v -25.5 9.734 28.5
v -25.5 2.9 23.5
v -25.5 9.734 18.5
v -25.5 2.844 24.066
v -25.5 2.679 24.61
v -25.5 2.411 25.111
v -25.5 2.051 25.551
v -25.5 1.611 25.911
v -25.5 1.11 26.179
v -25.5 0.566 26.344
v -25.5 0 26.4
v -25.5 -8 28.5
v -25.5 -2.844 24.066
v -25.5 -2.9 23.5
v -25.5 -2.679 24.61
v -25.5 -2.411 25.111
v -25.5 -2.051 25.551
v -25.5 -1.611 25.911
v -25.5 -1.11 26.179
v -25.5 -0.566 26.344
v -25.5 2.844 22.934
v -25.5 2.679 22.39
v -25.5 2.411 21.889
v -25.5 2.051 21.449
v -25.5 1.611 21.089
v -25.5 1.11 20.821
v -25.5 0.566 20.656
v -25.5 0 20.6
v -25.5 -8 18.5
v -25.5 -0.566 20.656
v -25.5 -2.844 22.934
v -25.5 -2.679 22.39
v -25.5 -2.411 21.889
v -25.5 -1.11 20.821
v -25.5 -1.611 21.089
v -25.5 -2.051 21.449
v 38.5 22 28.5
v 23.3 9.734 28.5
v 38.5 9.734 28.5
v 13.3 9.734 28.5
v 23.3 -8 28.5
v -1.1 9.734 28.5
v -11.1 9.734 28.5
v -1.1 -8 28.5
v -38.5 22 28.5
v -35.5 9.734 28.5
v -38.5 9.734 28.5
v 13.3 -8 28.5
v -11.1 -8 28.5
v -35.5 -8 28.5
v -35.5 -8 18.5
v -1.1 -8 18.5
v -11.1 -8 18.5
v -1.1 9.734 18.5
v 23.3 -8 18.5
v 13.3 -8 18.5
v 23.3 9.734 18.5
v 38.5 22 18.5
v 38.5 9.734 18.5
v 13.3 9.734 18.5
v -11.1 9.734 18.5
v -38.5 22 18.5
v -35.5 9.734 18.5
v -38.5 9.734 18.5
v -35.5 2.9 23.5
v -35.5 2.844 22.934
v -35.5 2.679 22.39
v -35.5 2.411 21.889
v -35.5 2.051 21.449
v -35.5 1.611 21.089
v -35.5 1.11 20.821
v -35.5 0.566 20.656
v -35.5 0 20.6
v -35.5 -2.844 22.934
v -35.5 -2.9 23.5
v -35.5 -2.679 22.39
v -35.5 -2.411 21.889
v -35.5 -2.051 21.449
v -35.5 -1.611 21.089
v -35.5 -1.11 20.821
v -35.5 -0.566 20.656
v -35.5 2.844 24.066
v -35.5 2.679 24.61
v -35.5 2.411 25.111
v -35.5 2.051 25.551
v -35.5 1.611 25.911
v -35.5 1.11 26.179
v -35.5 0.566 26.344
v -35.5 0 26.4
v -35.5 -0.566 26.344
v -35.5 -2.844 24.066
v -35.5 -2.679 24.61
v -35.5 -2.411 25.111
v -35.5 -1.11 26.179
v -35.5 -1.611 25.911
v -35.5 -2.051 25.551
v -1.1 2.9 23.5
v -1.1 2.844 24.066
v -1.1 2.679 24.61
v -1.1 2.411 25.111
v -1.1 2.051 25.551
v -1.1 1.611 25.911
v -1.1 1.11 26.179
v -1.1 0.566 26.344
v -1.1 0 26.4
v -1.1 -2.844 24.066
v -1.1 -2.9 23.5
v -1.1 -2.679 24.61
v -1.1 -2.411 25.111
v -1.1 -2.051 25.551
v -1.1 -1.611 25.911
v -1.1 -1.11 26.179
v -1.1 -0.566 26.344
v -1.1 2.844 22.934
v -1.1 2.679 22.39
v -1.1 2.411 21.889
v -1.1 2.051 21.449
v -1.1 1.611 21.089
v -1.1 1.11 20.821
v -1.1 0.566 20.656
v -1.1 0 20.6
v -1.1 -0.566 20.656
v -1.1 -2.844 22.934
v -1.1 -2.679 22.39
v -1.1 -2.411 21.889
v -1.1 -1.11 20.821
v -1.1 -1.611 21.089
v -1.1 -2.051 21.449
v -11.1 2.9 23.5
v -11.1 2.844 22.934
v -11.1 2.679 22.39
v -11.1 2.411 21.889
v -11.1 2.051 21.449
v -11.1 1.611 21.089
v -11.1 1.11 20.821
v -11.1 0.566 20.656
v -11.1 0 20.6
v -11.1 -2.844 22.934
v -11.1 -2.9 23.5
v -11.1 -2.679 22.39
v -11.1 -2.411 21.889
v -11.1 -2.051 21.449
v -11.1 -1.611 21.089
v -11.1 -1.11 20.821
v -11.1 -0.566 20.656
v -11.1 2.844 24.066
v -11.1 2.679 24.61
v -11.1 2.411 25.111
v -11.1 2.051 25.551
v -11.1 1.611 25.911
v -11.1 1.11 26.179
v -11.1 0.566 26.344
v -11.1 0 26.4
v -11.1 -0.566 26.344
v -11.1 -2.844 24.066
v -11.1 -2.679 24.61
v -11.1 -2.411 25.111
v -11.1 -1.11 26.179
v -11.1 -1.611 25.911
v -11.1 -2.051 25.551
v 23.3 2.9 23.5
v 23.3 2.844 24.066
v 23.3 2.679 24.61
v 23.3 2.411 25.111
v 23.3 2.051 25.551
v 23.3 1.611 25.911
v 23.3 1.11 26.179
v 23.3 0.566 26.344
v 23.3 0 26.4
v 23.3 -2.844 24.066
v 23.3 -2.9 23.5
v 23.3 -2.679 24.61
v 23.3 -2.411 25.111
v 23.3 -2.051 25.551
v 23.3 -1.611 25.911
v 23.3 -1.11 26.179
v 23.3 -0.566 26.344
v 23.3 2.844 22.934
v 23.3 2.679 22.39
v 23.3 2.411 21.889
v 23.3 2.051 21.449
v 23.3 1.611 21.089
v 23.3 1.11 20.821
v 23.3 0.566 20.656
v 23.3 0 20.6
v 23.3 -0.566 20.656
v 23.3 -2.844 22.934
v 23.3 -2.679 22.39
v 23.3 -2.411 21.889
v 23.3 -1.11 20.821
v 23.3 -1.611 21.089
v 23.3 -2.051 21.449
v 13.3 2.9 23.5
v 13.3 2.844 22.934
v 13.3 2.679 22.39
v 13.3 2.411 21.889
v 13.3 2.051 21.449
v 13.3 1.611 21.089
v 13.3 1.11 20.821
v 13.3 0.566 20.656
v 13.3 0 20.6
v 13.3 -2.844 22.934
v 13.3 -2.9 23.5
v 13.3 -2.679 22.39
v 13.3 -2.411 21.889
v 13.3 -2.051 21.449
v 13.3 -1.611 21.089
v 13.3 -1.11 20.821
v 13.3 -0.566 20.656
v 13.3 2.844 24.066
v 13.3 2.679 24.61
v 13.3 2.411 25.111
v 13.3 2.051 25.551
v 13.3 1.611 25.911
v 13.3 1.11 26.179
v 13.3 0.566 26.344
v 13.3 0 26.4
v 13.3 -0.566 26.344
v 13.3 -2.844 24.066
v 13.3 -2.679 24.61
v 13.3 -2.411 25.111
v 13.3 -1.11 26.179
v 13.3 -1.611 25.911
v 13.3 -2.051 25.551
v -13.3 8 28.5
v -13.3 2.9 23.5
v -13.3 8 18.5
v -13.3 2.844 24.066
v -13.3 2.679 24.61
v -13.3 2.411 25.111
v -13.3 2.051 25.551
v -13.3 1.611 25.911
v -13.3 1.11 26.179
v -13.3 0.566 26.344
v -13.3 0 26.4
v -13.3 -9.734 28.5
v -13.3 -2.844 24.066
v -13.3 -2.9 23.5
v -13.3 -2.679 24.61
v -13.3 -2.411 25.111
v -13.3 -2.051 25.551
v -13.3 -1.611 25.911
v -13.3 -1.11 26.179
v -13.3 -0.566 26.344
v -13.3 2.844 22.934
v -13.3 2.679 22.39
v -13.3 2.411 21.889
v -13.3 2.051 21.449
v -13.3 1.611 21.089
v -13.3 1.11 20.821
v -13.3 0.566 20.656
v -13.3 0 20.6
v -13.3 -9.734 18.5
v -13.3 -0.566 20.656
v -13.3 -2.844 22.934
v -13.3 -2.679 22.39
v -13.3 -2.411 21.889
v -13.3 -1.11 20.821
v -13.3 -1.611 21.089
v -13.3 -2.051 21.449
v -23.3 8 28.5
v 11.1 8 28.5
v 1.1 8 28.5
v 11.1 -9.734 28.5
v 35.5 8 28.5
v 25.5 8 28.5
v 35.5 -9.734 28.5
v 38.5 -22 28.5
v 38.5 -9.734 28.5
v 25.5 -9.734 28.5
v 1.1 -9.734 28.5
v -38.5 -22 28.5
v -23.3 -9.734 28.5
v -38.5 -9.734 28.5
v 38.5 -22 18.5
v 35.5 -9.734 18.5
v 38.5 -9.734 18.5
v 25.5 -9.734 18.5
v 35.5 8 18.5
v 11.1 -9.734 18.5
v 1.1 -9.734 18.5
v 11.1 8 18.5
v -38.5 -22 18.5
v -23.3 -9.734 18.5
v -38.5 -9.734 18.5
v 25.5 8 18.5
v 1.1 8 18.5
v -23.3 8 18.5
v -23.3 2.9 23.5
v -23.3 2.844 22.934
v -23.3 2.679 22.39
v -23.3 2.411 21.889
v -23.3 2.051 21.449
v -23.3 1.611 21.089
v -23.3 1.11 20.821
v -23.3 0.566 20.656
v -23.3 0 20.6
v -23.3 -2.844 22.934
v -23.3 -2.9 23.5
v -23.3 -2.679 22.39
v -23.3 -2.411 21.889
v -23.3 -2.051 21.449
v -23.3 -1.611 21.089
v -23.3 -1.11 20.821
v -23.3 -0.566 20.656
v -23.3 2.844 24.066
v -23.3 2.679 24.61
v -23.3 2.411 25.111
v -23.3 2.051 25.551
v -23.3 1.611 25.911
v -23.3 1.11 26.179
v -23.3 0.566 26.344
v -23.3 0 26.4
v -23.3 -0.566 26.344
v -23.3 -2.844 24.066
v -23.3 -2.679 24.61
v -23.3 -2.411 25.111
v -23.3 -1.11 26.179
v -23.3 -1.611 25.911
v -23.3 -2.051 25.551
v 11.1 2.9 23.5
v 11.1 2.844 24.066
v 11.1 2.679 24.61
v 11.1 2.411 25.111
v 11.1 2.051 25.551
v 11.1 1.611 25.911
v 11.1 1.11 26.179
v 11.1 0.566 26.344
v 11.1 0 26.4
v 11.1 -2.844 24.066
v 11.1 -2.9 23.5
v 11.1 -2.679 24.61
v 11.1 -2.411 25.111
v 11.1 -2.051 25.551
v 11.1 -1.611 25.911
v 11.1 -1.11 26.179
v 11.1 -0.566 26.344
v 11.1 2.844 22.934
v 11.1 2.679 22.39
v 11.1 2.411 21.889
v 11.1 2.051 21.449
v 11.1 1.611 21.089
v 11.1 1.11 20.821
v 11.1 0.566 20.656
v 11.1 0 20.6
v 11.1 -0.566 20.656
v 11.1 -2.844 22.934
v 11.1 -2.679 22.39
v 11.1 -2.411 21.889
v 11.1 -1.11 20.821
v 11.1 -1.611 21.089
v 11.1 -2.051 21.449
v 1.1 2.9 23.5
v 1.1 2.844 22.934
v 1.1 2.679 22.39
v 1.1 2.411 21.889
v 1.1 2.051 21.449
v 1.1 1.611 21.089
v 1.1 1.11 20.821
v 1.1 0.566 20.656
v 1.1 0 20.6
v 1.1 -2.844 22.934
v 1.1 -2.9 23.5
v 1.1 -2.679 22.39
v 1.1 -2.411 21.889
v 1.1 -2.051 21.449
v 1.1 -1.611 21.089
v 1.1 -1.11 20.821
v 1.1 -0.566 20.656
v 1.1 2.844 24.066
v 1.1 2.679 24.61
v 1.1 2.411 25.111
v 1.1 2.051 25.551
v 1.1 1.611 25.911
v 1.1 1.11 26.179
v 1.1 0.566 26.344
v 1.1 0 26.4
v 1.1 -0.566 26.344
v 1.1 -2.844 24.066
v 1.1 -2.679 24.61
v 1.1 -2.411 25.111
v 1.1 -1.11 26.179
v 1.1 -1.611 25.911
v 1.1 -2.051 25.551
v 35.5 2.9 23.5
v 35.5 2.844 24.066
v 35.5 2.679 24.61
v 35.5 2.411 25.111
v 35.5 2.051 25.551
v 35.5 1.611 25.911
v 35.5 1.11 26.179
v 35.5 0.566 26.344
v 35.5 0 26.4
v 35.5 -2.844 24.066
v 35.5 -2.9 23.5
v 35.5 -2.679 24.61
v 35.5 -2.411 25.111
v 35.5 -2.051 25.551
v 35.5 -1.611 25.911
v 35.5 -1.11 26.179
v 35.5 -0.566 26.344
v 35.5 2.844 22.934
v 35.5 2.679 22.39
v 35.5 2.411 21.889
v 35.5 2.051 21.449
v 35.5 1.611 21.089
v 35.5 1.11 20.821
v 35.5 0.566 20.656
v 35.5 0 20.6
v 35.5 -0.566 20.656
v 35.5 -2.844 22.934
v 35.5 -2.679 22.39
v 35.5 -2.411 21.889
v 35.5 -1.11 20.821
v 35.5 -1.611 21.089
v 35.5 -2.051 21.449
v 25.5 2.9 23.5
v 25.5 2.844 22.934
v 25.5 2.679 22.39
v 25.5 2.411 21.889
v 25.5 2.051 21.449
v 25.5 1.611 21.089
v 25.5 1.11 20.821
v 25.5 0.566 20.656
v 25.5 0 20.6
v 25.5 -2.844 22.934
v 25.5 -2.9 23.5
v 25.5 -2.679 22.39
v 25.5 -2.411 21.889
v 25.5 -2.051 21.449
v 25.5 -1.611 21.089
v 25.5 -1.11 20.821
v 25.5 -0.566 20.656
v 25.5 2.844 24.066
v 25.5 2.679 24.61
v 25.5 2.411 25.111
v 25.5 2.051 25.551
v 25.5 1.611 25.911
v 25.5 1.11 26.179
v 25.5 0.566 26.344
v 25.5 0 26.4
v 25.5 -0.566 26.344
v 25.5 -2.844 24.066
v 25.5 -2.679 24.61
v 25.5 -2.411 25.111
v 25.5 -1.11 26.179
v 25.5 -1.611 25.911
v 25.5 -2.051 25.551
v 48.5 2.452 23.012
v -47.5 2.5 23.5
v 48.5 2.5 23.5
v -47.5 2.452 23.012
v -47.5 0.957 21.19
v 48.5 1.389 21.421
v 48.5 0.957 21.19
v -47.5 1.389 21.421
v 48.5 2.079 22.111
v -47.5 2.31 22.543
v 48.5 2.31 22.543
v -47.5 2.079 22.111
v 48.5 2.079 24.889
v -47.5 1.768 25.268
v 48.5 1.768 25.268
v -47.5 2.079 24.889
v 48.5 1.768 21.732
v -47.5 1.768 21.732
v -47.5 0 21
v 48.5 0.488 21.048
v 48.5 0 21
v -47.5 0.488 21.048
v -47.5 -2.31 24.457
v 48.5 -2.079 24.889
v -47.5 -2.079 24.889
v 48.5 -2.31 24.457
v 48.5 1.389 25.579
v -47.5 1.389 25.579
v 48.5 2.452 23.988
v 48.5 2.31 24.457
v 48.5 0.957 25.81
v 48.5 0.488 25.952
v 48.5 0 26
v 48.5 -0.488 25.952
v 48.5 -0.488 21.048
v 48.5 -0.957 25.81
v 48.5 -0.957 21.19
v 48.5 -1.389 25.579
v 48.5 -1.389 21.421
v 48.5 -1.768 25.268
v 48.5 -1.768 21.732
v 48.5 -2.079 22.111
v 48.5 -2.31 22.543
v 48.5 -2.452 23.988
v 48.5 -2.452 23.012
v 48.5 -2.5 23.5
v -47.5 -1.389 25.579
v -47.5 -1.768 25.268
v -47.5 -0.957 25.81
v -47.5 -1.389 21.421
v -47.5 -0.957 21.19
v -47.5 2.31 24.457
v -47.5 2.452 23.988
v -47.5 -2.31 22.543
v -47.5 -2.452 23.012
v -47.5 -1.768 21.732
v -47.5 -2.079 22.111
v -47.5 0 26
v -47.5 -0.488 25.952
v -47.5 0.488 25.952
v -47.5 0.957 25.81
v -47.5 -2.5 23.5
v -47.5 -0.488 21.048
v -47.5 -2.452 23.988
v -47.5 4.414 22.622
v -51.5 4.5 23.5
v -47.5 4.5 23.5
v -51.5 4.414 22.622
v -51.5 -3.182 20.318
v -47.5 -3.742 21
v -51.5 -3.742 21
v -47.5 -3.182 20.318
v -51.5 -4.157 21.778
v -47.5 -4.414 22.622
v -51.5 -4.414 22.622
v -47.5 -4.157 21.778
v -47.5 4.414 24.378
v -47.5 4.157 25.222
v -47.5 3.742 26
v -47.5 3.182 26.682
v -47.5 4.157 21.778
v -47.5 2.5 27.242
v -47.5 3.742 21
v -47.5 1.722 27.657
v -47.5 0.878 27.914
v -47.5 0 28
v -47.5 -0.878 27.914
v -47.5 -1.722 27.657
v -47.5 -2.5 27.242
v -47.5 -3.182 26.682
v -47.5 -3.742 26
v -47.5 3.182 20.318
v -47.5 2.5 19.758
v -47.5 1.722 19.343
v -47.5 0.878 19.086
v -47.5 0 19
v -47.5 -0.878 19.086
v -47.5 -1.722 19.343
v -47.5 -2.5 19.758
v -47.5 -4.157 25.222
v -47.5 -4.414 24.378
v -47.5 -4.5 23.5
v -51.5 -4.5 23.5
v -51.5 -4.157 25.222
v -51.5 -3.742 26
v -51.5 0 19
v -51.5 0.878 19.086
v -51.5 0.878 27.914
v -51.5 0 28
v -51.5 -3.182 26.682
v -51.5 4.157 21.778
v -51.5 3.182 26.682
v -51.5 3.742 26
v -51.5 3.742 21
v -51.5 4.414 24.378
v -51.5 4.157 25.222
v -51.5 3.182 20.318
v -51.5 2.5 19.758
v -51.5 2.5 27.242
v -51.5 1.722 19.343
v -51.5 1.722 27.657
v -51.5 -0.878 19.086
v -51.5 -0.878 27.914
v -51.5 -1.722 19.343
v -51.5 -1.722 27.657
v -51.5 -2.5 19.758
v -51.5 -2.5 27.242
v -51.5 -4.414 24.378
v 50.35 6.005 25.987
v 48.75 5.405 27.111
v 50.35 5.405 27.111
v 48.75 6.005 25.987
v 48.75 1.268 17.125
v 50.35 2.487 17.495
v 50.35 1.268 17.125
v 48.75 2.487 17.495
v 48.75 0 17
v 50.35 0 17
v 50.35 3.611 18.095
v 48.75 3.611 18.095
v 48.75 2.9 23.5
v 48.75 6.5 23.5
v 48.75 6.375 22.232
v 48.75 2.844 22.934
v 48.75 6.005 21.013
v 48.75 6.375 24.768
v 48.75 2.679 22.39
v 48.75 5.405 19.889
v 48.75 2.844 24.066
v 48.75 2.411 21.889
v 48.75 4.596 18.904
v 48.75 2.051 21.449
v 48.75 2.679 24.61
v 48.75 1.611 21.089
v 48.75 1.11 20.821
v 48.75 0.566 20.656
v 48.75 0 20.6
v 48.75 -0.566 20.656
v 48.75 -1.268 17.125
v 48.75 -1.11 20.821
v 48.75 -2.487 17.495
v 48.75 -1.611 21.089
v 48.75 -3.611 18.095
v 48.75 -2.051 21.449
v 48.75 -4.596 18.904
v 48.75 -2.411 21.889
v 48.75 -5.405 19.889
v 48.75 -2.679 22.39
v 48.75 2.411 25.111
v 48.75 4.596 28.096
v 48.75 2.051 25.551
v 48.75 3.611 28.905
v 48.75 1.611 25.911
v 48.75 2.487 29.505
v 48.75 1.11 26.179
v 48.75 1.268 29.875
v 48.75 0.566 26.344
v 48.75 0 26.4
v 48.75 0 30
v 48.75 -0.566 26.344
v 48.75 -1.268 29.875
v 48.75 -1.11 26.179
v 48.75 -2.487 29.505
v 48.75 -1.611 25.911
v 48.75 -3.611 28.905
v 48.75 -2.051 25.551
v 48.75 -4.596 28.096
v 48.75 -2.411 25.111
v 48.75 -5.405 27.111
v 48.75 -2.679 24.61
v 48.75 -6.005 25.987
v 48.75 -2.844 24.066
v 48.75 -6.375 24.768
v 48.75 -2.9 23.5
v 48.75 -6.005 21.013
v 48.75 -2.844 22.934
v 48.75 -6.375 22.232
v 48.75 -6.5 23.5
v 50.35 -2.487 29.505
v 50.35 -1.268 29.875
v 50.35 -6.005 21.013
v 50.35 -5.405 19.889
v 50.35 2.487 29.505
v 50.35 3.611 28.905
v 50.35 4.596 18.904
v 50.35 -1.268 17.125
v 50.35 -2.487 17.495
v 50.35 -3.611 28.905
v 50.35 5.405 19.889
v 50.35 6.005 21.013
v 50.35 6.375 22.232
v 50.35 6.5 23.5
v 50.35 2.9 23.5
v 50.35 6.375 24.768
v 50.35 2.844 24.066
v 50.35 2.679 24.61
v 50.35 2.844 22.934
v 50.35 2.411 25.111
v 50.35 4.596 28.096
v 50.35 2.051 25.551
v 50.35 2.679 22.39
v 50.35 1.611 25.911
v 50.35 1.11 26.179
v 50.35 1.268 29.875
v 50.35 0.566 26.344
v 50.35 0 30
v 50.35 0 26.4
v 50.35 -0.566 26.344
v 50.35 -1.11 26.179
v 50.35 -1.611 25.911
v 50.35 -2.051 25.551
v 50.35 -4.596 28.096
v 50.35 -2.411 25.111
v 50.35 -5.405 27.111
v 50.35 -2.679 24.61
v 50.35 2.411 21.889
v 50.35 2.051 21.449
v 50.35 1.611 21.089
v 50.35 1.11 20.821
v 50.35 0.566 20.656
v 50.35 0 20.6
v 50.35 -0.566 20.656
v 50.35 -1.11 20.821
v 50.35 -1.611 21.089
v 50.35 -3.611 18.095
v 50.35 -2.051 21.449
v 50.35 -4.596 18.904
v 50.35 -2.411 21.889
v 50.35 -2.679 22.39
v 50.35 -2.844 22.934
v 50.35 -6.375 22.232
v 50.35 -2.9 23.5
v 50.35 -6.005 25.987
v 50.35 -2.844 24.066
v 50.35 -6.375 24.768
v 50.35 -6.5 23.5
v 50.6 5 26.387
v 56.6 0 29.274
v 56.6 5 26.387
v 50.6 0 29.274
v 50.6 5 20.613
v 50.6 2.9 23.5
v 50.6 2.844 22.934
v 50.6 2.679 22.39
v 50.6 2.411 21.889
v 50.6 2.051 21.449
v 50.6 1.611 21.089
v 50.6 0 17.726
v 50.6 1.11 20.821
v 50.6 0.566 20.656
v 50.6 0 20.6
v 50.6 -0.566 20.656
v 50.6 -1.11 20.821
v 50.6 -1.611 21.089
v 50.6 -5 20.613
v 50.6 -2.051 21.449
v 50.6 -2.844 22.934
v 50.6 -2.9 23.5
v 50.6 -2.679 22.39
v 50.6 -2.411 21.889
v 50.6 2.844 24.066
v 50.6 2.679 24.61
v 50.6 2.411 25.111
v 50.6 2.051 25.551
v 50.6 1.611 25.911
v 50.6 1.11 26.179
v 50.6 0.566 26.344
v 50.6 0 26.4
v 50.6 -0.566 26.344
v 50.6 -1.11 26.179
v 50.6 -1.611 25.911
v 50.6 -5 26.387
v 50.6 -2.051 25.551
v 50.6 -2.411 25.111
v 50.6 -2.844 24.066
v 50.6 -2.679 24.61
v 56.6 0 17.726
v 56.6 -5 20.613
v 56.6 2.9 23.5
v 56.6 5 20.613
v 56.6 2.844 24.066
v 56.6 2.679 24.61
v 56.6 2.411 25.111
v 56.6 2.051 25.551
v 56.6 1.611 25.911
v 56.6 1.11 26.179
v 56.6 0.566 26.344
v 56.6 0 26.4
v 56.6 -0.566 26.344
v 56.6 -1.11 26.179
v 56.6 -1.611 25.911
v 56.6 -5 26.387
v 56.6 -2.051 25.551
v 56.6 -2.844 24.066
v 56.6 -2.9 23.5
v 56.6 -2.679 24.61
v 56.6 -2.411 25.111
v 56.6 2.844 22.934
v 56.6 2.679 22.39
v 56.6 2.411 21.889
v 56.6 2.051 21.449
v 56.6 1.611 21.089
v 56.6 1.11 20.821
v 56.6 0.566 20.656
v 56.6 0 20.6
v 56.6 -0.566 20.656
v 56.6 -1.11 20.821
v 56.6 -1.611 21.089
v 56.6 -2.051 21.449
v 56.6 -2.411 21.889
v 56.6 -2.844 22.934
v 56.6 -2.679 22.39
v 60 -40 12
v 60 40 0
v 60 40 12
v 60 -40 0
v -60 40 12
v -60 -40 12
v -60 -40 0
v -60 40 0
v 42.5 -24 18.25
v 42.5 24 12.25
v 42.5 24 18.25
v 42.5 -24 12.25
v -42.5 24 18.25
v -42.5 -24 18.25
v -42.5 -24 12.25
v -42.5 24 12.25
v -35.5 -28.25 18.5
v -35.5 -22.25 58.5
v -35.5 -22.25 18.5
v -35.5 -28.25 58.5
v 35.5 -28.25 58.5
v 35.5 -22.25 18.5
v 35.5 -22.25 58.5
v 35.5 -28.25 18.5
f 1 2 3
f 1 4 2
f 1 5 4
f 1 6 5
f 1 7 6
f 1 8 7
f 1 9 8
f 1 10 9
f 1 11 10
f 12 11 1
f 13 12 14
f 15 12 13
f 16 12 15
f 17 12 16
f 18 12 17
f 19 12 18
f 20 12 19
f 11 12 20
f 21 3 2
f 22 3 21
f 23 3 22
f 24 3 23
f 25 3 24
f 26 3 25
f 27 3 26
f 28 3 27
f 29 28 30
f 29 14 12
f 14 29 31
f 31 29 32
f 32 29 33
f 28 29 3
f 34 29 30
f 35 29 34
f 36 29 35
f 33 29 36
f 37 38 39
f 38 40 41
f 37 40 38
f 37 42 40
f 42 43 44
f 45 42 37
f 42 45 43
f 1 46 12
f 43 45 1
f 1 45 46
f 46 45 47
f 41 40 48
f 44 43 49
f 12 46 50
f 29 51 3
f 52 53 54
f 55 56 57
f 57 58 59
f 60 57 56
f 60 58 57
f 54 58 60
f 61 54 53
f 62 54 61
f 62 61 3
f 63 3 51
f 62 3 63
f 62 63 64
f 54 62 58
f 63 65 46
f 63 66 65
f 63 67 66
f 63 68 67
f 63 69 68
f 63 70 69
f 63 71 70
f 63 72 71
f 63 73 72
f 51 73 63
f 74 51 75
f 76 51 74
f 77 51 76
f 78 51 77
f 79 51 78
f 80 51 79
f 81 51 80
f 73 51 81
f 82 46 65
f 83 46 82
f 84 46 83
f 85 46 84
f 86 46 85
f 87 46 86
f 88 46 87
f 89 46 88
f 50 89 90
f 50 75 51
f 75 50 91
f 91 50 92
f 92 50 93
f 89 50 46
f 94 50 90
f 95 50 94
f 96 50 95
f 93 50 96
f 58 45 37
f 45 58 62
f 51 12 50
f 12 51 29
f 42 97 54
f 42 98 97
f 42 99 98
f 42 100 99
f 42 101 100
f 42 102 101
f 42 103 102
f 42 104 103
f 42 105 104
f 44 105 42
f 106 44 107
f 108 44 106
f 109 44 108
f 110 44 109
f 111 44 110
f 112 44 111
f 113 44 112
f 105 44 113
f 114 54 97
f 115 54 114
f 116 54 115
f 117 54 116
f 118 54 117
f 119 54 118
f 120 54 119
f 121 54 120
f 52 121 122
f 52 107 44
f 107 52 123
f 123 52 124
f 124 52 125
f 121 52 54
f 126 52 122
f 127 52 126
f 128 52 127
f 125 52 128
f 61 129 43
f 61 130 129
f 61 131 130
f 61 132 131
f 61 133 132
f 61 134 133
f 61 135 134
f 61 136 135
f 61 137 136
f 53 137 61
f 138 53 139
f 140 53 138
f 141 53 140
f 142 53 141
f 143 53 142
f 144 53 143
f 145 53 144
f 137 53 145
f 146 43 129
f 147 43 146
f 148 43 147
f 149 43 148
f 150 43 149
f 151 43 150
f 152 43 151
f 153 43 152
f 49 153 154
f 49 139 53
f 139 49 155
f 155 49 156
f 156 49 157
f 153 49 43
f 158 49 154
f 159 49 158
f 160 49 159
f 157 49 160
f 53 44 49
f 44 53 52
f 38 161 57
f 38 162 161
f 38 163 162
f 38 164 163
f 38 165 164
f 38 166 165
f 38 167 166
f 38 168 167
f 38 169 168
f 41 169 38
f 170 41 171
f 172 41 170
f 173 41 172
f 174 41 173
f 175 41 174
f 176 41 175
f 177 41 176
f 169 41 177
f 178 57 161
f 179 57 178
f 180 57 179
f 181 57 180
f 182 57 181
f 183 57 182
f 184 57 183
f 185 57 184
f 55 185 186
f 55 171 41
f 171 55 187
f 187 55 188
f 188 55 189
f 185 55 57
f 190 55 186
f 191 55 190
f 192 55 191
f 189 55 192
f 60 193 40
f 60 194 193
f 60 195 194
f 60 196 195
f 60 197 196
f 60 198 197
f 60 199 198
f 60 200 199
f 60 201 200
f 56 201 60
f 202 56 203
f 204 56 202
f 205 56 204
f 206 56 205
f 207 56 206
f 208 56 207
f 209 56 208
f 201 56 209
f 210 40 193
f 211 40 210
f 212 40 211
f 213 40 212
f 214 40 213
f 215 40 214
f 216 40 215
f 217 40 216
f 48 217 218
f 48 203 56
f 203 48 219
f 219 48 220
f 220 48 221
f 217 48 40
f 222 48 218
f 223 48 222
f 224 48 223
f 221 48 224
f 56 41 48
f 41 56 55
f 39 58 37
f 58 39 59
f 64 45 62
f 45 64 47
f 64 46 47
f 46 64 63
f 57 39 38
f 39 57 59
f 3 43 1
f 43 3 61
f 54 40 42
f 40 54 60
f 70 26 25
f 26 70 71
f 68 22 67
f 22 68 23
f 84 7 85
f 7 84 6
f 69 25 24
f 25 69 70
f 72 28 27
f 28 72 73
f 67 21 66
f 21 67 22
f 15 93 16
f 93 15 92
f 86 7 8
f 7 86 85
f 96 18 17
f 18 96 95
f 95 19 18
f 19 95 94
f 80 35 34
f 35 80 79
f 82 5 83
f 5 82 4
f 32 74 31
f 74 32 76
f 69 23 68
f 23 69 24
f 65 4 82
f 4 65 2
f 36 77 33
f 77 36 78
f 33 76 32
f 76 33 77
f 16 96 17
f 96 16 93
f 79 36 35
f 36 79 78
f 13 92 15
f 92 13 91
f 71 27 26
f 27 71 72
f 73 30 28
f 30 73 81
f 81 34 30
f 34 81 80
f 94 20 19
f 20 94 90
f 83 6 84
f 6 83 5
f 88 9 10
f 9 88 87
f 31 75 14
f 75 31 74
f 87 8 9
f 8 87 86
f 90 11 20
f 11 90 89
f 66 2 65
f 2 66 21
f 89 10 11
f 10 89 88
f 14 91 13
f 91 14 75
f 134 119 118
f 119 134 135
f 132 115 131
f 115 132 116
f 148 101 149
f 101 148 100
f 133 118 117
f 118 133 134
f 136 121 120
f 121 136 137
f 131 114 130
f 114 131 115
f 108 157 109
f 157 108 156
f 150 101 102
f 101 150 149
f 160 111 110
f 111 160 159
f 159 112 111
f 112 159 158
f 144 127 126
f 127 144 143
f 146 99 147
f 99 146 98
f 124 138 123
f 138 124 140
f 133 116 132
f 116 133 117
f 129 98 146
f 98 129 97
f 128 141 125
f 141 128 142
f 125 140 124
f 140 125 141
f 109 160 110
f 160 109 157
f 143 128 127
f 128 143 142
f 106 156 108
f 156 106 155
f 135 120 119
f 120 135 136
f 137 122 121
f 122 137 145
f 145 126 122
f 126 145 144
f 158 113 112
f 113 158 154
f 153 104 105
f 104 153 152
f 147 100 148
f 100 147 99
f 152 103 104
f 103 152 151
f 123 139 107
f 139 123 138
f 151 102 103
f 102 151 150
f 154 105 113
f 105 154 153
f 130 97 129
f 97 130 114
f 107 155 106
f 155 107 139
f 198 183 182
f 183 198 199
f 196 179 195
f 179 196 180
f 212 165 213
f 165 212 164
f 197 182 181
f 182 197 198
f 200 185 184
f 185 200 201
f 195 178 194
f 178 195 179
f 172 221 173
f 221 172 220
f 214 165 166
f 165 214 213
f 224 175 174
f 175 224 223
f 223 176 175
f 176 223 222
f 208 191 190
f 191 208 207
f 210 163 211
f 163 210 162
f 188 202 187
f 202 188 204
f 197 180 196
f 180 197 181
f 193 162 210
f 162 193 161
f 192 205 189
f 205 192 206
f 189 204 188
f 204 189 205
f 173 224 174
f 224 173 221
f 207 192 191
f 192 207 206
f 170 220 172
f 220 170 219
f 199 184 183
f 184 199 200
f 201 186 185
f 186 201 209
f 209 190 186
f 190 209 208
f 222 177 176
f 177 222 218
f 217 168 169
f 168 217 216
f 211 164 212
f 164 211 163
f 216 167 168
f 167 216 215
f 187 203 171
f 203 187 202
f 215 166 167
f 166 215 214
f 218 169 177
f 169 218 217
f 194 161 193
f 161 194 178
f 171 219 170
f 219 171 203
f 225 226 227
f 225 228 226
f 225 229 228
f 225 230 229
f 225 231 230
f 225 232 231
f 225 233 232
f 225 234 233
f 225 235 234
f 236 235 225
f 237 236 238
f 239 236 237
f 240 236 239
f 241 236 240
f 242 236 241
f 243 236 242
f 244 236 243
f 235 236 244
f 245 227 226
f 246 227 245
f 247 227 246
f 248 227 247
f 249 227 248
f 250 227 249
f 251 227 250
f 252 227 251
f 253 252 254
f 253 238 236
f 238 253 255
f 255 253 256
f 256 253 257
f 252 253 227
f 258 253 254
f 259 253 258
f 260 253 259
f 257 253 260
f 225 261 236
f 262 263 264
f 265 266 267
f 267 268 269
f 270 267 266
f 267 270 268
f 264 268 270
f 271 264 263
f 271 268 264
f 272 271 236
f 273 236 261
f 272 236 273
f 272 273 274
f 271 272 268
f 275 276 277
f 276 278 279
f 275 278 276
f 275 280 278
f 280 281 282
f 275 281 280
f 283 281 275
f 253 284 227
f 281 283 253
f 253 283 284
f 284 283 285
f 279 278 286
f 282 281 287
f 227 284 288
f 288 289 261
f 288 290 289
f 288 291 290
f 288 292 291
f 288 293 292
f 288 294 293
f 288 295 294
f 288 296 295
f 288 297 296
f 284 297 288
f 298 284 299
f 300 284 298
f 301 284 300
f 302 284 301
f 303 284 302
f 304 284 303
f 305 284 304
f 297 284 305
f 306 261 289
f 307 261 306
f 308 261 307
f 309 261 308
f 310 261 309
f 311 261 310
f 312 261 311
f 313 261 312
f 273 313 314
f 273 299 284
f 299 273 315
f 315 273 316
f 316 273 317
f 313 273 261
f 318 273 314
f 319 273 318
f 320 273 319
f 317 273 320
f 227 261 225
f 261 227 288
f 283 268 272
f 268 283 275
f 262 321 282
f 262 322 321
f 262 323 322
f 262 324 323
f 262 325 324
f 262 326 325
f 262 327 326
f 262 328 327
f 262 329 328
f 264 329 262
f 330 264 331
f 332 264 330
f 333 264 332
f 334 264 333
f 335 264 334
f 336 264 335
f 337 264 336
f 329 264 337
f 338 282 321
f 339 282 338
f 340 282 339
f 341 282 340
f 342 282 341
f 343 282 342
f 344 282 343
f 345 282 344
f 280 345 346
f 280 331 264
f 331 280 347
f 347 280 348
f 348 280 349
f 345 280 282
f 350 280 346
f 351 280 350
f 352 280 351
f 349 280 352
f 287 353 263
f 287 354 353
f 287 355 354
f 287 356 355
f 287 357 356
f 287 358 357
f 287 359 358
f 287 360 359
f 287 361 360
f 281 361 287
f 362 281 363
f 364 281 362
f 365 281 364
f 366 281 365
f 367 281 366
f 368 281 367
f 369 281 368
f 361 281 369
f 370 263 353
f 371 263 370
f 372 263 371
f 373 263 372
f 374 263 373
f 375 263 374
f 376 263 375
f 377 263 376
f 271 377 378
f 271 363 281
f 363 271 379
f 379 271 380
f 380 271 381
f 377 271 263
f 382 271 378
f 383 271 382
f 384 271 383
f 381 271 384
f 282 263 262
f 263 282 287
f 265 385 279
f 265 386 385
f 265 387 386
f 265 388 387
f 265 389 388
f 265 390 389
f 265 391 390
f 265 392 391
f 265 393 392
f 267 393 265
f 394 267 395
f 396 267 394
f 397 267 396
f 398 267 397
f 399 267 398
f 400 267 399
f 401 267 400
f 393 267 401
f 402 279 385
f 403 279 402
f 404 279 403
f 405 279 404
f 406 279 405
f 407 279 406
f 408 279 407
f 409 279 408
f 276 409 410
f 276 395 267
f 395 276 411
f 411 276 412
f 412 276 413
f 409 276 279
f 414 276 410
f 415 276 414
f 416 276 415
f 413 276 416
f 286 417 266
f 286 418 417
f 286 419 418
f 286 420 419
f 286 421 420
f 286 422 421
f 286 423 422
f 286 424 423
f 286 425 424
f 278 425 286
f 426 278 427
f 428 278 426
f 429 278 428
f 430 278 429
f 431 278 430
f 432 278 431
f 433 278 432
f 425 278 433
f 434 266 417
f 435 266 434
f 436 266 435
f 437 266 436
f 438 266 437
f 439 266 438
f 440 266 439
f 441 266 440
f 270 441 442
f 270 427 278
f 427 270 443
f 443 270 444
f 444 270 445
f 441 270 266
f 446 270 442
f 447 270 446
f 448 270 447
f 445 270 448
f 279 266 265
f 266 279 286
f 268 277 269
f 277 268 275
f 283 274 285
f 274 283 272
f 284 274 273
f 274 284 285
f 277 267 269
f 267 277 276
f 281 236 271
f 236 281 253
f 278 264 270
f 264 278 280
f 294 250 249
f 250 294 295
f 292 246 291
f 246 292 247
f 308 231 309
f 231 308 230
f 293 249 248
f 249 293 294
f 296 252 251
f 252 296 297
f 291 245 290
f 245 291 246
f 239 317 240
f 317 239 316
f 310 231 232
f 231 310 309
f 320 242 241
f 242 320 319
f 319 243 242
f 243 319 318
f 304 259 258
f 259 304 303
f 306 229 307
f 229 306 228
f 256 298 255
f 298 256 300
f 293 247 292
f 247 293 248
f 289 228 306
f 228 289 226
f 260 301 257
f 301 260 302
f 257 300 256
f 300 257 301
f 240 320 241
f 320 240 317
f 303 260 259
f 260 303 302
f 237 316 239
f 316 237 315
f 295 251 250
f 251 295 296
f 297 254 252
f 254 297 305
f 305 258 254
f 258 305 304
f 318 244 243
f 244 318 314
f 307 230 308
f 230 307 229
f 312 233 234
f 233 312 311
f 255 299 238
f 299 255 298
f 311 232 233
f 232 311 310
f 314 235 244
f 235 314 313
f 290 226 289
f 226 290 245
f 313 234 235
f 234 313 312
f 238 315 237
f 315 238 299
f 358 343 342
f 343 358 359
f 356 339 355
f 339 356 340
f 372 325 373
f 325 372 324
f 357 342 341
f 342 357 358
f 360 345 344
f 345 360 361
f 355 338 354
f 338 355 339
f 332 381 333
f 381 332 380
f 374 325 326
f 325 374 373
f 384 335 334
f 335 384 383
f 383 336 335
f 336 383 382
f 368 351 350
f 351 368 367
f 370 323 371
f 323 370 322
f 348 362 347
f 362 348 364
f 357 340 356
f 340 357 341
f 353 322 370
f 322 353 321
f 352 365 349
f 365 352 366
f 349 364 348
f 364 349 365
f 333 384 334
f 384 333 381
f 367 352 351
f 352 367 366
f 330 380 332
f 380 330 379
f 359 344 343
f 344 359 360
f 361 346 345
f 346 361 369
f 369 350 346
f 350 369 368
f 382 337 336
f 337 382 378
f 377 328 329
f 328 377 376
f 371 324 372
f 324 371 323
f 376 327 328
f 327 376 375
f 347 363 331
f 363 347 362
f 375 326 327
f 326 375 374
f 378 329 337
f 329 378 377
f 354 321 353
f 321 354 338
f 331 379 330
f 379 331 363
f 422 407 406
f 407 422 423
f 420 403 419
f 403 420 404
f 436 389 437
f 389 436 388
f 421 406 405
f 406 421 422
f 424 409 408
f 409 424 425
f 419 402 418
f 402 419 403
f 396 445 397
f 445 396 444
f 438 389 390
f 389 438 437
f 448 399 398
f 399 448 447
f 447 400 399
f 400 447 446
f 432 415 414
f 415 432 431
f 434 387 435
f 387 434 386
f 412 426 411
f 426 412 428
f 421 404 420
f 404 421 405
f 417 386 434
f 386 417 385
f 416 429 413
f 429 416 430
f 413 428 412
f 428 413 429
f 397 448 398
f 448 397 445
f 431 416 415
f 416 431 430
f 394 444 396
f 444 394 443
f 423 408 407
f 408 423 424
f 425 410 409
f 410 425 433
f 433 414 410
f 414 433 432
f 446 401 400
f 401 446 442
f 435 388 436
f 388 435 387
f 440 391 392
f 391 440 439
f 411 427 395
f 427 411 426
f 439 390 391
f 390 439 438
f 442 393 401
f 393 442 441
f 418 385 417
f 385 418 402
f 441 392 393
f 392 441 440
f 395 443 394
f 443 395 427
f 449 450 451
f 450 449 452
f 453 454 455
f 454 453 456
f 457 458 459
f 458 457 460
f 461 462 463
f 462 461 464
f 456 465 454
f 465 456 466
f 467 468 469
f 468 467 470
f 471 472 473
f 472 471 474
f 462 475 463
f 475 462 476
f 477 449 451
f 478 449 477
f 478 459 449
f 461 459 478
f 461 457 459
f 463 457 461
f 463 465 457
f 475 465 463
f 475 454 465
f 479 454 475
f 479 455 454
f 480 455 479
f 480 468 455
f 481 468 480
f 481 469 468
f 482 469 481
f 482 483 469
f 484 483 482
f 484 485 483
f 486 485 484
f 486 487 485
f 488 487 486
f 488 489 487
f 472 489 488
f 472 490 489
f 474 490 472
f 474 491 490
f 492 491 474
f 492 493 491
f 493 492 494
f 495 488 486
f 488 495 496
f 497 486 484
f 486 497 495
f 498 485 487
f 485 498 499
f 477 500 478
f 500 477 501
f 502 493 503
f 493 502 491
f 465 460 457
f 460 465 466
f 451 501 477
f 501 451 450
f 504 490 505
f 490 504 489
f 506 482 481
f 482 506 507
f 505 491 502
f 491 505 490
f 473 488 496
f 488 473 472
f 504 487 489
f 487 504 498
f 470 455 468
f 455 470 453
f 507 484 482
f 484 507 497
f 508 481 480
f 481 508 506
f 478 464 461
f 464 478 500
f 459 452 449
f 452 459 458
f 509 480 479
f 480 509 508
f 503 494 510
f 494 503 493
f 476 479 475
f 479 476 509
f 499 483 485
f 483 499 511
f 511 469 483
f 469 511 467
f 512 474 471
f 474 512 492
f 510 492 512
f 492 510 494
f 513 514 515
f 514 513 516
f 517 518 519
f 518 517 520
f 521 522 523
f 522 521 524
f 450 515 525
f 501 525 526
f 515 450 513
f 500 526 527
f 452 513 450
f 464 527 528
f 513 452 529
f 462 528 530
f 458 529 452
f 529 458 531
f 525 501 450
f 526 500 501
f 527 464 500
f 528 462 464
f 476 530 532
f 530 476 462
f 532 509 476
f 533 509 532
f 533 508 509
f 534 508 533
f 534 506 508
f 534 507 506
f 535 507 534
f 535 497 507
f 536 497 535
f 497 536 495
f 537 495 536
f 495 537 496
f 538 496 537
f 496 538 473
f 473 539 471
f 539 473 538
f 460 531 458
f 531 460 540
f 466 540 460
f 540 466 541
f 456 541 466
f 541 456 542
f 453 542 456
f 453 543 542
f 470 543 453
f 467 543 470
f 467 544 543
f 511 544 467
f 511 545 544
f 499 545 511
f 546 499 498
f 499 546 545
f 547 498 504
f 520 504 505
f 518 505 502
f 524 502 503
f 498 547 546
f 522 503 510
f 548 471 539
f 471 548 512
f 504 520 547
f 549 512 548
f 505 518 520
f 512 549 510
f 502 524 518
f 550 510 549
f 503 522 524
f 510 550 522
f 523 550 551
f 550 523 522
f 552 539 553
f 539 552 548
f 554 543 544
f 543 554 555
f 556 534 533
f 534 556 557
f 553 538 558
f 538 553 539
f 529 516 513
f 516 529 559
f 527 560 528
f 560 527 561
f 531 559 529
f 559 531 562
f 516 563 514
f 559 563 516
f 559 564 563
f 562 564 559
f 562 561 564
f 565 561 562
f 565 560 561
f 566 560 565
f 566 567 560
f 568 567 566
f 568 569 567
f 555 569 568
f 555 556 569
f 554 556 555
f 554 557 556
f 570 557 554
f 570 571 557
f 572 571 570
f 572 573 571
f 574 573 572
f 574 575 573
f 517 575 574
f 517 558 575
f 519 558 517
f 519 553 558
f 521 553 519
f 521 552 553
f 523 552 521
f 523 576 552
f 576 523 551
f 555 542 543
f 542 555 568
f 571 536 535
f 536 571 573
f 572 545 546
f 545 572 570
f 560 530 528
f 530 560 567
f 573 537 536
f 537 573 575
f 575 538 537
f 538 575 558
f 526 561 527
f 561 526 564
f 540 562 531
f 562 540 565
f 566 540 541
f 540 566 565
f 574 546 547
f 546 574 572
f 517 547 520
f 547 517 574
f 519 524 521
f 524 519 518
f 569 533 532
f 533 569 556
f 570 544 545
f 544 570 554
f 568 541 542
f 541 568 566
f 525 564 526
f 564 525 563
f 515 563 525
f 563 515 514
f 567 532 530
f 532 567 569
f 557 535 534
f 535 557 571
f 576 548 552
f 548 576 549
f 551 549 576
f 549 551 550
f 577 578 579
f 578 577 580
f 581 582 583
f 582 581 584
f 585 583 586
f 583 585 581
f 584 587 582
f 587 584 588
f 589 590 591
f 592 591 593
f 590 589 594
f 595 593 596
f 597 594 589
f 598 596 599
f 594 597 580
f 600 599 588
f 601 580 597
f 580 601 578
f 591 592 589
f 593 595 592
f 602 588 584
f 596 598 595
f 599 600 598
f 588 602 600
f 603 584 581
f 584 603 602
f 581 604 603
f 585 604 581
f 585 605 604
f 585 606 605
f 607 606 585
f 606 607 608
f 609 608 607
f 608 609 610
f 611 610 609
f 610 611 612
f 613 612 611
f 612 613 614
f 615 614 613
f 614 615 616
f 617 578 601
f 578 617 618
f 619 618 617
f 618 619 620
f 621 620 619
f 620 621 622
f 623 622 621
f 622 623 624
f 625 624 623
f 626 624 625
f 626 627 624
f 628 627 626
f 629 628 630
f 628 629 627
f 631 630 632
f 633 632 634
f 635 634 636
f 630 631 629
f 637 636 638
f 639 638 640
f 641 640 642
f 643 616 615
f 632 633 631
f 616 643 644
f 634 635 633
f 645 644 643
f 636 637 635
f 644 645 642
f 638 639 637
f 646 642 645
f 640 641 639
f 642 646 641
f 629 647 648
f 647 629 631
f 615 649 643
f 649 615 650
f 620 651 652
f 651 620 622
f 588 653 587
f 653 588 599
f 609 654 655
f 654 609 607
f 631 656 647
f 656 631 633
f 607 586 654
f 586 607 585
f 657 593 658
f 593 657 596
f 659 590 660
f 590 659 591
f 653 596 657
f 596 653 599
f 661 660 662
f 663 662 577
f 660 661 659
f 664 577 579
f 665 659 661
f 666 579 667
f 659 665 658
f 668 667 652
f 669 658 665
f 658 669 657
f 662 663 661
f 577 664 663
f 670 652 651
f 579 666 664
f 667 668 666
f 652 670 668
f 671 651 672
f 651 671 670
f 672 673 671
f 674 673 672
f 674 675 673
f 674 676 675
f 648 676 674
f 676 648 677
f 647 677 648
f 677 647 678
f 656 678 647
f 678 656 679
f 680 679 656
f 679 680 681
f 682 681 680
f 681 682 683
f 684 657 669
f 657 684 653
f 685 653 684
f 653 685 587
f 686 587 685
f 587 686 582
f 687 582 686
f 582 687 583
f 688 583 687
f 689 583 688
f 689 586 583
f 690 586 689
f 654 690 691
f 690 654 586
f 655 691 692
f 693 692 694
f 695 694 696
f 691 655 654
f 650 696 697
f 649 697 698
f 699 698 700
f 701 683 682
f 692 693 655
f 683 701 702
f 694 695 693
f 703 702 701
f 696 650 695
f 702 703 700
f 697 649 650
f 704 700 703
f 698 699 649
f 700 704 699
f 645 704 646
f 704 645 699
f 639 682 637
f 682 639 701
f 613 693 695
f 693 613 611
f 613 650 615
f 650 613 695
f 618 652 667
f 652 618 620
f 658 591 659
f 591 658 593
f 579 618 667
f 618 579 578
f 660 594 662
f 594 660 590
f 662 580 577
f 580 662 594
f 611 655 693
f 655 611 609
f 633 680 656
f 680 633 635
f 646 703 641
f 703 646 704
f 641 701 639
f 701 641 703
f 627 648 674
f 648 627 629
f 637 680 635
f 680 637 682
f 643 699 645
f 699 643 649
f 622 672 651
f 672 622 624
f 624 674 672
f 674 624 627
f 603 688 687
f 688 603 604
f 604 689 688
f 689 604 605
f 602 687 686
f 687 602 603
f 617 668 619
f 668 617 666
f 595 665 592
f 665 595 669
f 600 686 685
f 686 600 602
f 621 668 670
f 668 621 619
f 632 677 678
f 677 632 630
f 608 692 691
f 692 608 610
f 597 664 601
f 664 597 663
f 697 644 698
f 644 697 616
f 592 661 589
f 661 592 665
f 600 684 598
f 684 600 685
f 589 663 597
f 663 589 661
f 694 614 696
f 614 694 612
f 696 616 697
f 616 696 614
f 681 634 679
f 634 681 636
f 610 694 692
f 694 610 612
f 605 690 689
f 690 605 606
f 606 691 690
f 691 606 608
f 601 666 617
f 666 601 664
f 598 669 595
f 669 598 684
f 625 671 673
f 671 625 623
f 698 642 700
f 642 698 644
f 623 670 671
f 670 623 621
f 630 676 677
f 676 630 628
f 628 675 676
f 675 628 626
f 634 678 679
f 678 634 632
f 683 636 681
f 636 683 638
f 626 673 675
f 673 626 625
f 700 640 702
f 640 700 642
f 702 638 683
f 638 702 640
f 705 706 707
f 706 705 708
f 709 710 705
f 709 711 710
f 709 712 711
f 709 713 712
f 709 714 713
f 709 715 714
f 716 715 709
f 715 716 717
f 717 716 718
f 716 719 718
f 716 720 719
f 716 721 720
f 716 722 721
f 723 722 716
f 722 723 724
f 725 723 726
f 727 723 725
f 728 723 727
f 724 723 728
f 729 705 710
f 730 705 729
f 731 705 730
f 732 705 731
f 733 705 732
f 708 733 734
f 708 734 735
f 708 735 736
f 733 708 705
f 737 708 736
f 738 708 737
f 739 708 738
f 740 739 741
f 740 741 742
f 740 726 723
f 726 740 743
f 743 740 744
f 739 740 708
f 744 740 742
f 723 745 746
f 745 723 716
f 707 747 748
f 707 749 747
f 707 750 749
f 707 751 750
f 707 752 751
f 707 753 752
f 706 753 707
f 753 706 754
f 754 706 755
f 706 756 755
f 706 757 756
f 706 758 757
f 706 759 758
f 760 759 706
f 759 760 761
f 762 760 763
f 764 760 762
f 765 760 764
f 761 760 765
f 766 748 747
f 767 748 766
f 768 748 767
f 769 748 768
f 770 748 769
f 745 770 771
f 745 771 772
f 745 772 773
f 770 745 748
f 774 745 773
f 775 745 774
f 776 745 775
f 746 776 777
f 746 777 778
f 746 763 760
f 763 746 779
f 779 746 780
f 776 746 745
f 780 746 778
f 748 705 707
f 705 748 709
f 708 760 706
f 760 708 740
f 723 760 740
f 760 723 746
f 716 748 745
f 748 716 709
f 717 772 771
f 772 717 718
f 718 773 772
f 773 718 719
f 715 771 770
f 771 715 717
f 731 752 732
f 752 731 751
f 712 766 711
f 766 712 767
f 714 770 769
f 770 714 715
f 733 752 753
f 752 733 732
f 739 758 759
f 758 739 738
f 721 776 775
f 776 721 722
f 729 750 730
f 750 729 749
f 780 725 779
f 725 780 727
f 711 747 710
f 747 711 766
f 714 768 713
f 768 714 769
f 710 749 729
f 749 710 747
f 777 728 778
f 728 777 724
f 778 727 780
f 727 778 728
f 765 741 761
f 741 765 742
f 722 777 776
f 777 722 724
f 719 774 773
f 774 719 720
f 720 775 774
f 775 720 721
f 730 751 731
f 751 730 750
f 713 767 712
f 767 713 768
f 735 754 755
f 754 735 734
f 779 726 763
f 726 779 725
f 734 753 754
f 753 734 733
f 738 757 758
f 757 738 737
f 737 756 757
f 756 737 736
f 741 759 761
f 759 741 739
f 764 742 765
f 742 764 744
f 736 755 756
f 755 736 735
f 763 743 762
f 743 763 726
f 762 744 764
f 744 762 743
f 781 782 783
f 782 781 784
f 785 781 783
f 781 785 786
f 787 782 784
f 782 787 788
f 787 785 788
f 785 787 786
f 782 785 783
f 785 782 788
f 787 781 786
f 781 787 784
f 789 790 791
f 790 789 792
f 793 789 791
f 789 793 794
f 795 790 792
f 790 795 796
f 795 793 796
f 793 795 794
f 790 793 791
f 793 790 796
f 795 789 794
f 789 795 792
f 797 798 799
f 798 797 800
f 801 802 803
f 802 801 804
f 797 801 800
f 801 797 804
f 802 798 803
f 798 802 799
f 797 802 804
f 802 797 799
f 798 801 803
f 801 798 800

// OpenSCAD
$fn = 32;

// ------------------------------------------------------------------------
// Comb hinge with flap: leaf 77 x 22 mm, pin d5, flap 40 mm
// Every part is its own module, assembly() places every instance.
// ------------------------------------------------------------------------

// --- part 1 ---
module hinge_bed() {
  difference() {
    translate([-60, -40, 0]) cube([120, 80, 12]);
  }
}

// --- part 2 ---
module hinge_riser() {
  difference() {
    translate([-42.5, -24, 0]) cube([85, 48, 6]);
  }
}

// --- part 3 ---
module hinge_leaf_a() {
  difference() {
    union() {
      translate([-35.5, -8, -5]) cube([10, 30, 10]);
      translate([-11.1, -8, -5]) cube([10, 30, 10]);
      translate([13.3, -8, -5]) cube([10, 30, 10]);
      translate([-38.5, 9.734, -5]) cube([77, 12.266, 10]);
    }
    translate([-30.5, 0, 0]) rotate([0, 90, 0]) cylinder(h = 12, d = 5.8, center = true);
    translate([-6.1, 0, 0]) rotate([0, 90, 0]) cylinder(h = 12, d = 5.8, center = true);
    translate([18.3, 0, 0]) rotate([0, 90, 0]) cylinder(h = 12, d = 5.8, center = true);
  }
}

// --- part 4 ---
module hinge_leaf_b() {
  difference() {
    union() {
      translate([-23.3, -22, -5]) cube([10, 30, 10]);
      translate([1.1, -22, -5]) cube([10, 30, 10]);
      translate([25.5, -22, -5]) cube([10, 30, 10]);
      translate([-38.5, -22, -5]) cube([77, 12.266, 10]);
    }
    translate([-18.3, 0, 0]) rotate([0, 90, 0]) cylinder(h = 12, d = 5.8, center = true);
    translate([6.1, 0, 0]) rotate([0, 90, 0]) cylinder(h = 12, d = 5.8, center = true);
    translate([30.5, 0, 0]) rotate([0, 90, 0]) cylinder(h = 12, d = 5.8, center = true);
  }
}

// --- part 5 ---
module hinge_flap() {
  difference() {
    translate([-35.5, -20, 0]) cube([71, 40, 6]);
  }
}

// --- part 6 ---
module hinge_pin() {
  rotate([0, 90, 0]) cylinder(h = 97, d = 5, center = true);
  translate([-51.5, 0, 0]) rotate([0, 90, 0]) cylinder(h = 4, d = 9);
}

// --- part 7 ---
module pin_washer() {
  difference() {
      translate([0, 0, 0]) cylinder(h = 1.6, d = 13);
      translate([0, 0, -1]) cylinder(h = 3.6, d = 5.8);
    }
}

// --- part 8 ---
module pin_nut() {
  difference() {
    linear_extrude(height = 6) polygon(points = [[5.774, 0], [2.887, 5], [-2.887, 5], [-5.774, 0], [-2.887, -5], [2.887, -5]]);
    translate([0, 0, -1]) cylinder(h = 8, d = 5.8);
  }
}

// --- assembly ---
module assembly() {
  color([0.80, 0.24, 0.20]) translate([0, 0, 0]) rotate([0, 0, 0]) hinge_bed();
  color([0.20, 0.45, 0.75]) translate([0, 0, 12.25]) rotate([0, 0, 0]) hinge_riser();
  color([0.25, 0.62, 0.32]) translate([0, 0, 23.5]) rotate([0, 0, 0]) hinge_leaf_a();
  color([0.92, 0.70, 0.18]) translate([0, 0, 23.5]) rotate([0, 0, 0]) hinge_leaf_b();
  color([0.58, 0.35, 0.70]) translate([0, -22.25, 38.5]) rotate([90, 0, 0]) hinge_flap();
  color([0.16, 0.66, 0.66]) translate([0, 0, 23.5]) rotate([0, 0, 0]) hinge_pin();
  color([0.85, 0.48, 0.18]) translate([48.75, 0, 23.5]) rotate([0, 90, 0]) pin_washer();
  color([0.55, 0.60, 0.65]) translate([50.6, 0, 23.5]) rotate([0, 90, 0]) pin_nut();
}

assembly();
